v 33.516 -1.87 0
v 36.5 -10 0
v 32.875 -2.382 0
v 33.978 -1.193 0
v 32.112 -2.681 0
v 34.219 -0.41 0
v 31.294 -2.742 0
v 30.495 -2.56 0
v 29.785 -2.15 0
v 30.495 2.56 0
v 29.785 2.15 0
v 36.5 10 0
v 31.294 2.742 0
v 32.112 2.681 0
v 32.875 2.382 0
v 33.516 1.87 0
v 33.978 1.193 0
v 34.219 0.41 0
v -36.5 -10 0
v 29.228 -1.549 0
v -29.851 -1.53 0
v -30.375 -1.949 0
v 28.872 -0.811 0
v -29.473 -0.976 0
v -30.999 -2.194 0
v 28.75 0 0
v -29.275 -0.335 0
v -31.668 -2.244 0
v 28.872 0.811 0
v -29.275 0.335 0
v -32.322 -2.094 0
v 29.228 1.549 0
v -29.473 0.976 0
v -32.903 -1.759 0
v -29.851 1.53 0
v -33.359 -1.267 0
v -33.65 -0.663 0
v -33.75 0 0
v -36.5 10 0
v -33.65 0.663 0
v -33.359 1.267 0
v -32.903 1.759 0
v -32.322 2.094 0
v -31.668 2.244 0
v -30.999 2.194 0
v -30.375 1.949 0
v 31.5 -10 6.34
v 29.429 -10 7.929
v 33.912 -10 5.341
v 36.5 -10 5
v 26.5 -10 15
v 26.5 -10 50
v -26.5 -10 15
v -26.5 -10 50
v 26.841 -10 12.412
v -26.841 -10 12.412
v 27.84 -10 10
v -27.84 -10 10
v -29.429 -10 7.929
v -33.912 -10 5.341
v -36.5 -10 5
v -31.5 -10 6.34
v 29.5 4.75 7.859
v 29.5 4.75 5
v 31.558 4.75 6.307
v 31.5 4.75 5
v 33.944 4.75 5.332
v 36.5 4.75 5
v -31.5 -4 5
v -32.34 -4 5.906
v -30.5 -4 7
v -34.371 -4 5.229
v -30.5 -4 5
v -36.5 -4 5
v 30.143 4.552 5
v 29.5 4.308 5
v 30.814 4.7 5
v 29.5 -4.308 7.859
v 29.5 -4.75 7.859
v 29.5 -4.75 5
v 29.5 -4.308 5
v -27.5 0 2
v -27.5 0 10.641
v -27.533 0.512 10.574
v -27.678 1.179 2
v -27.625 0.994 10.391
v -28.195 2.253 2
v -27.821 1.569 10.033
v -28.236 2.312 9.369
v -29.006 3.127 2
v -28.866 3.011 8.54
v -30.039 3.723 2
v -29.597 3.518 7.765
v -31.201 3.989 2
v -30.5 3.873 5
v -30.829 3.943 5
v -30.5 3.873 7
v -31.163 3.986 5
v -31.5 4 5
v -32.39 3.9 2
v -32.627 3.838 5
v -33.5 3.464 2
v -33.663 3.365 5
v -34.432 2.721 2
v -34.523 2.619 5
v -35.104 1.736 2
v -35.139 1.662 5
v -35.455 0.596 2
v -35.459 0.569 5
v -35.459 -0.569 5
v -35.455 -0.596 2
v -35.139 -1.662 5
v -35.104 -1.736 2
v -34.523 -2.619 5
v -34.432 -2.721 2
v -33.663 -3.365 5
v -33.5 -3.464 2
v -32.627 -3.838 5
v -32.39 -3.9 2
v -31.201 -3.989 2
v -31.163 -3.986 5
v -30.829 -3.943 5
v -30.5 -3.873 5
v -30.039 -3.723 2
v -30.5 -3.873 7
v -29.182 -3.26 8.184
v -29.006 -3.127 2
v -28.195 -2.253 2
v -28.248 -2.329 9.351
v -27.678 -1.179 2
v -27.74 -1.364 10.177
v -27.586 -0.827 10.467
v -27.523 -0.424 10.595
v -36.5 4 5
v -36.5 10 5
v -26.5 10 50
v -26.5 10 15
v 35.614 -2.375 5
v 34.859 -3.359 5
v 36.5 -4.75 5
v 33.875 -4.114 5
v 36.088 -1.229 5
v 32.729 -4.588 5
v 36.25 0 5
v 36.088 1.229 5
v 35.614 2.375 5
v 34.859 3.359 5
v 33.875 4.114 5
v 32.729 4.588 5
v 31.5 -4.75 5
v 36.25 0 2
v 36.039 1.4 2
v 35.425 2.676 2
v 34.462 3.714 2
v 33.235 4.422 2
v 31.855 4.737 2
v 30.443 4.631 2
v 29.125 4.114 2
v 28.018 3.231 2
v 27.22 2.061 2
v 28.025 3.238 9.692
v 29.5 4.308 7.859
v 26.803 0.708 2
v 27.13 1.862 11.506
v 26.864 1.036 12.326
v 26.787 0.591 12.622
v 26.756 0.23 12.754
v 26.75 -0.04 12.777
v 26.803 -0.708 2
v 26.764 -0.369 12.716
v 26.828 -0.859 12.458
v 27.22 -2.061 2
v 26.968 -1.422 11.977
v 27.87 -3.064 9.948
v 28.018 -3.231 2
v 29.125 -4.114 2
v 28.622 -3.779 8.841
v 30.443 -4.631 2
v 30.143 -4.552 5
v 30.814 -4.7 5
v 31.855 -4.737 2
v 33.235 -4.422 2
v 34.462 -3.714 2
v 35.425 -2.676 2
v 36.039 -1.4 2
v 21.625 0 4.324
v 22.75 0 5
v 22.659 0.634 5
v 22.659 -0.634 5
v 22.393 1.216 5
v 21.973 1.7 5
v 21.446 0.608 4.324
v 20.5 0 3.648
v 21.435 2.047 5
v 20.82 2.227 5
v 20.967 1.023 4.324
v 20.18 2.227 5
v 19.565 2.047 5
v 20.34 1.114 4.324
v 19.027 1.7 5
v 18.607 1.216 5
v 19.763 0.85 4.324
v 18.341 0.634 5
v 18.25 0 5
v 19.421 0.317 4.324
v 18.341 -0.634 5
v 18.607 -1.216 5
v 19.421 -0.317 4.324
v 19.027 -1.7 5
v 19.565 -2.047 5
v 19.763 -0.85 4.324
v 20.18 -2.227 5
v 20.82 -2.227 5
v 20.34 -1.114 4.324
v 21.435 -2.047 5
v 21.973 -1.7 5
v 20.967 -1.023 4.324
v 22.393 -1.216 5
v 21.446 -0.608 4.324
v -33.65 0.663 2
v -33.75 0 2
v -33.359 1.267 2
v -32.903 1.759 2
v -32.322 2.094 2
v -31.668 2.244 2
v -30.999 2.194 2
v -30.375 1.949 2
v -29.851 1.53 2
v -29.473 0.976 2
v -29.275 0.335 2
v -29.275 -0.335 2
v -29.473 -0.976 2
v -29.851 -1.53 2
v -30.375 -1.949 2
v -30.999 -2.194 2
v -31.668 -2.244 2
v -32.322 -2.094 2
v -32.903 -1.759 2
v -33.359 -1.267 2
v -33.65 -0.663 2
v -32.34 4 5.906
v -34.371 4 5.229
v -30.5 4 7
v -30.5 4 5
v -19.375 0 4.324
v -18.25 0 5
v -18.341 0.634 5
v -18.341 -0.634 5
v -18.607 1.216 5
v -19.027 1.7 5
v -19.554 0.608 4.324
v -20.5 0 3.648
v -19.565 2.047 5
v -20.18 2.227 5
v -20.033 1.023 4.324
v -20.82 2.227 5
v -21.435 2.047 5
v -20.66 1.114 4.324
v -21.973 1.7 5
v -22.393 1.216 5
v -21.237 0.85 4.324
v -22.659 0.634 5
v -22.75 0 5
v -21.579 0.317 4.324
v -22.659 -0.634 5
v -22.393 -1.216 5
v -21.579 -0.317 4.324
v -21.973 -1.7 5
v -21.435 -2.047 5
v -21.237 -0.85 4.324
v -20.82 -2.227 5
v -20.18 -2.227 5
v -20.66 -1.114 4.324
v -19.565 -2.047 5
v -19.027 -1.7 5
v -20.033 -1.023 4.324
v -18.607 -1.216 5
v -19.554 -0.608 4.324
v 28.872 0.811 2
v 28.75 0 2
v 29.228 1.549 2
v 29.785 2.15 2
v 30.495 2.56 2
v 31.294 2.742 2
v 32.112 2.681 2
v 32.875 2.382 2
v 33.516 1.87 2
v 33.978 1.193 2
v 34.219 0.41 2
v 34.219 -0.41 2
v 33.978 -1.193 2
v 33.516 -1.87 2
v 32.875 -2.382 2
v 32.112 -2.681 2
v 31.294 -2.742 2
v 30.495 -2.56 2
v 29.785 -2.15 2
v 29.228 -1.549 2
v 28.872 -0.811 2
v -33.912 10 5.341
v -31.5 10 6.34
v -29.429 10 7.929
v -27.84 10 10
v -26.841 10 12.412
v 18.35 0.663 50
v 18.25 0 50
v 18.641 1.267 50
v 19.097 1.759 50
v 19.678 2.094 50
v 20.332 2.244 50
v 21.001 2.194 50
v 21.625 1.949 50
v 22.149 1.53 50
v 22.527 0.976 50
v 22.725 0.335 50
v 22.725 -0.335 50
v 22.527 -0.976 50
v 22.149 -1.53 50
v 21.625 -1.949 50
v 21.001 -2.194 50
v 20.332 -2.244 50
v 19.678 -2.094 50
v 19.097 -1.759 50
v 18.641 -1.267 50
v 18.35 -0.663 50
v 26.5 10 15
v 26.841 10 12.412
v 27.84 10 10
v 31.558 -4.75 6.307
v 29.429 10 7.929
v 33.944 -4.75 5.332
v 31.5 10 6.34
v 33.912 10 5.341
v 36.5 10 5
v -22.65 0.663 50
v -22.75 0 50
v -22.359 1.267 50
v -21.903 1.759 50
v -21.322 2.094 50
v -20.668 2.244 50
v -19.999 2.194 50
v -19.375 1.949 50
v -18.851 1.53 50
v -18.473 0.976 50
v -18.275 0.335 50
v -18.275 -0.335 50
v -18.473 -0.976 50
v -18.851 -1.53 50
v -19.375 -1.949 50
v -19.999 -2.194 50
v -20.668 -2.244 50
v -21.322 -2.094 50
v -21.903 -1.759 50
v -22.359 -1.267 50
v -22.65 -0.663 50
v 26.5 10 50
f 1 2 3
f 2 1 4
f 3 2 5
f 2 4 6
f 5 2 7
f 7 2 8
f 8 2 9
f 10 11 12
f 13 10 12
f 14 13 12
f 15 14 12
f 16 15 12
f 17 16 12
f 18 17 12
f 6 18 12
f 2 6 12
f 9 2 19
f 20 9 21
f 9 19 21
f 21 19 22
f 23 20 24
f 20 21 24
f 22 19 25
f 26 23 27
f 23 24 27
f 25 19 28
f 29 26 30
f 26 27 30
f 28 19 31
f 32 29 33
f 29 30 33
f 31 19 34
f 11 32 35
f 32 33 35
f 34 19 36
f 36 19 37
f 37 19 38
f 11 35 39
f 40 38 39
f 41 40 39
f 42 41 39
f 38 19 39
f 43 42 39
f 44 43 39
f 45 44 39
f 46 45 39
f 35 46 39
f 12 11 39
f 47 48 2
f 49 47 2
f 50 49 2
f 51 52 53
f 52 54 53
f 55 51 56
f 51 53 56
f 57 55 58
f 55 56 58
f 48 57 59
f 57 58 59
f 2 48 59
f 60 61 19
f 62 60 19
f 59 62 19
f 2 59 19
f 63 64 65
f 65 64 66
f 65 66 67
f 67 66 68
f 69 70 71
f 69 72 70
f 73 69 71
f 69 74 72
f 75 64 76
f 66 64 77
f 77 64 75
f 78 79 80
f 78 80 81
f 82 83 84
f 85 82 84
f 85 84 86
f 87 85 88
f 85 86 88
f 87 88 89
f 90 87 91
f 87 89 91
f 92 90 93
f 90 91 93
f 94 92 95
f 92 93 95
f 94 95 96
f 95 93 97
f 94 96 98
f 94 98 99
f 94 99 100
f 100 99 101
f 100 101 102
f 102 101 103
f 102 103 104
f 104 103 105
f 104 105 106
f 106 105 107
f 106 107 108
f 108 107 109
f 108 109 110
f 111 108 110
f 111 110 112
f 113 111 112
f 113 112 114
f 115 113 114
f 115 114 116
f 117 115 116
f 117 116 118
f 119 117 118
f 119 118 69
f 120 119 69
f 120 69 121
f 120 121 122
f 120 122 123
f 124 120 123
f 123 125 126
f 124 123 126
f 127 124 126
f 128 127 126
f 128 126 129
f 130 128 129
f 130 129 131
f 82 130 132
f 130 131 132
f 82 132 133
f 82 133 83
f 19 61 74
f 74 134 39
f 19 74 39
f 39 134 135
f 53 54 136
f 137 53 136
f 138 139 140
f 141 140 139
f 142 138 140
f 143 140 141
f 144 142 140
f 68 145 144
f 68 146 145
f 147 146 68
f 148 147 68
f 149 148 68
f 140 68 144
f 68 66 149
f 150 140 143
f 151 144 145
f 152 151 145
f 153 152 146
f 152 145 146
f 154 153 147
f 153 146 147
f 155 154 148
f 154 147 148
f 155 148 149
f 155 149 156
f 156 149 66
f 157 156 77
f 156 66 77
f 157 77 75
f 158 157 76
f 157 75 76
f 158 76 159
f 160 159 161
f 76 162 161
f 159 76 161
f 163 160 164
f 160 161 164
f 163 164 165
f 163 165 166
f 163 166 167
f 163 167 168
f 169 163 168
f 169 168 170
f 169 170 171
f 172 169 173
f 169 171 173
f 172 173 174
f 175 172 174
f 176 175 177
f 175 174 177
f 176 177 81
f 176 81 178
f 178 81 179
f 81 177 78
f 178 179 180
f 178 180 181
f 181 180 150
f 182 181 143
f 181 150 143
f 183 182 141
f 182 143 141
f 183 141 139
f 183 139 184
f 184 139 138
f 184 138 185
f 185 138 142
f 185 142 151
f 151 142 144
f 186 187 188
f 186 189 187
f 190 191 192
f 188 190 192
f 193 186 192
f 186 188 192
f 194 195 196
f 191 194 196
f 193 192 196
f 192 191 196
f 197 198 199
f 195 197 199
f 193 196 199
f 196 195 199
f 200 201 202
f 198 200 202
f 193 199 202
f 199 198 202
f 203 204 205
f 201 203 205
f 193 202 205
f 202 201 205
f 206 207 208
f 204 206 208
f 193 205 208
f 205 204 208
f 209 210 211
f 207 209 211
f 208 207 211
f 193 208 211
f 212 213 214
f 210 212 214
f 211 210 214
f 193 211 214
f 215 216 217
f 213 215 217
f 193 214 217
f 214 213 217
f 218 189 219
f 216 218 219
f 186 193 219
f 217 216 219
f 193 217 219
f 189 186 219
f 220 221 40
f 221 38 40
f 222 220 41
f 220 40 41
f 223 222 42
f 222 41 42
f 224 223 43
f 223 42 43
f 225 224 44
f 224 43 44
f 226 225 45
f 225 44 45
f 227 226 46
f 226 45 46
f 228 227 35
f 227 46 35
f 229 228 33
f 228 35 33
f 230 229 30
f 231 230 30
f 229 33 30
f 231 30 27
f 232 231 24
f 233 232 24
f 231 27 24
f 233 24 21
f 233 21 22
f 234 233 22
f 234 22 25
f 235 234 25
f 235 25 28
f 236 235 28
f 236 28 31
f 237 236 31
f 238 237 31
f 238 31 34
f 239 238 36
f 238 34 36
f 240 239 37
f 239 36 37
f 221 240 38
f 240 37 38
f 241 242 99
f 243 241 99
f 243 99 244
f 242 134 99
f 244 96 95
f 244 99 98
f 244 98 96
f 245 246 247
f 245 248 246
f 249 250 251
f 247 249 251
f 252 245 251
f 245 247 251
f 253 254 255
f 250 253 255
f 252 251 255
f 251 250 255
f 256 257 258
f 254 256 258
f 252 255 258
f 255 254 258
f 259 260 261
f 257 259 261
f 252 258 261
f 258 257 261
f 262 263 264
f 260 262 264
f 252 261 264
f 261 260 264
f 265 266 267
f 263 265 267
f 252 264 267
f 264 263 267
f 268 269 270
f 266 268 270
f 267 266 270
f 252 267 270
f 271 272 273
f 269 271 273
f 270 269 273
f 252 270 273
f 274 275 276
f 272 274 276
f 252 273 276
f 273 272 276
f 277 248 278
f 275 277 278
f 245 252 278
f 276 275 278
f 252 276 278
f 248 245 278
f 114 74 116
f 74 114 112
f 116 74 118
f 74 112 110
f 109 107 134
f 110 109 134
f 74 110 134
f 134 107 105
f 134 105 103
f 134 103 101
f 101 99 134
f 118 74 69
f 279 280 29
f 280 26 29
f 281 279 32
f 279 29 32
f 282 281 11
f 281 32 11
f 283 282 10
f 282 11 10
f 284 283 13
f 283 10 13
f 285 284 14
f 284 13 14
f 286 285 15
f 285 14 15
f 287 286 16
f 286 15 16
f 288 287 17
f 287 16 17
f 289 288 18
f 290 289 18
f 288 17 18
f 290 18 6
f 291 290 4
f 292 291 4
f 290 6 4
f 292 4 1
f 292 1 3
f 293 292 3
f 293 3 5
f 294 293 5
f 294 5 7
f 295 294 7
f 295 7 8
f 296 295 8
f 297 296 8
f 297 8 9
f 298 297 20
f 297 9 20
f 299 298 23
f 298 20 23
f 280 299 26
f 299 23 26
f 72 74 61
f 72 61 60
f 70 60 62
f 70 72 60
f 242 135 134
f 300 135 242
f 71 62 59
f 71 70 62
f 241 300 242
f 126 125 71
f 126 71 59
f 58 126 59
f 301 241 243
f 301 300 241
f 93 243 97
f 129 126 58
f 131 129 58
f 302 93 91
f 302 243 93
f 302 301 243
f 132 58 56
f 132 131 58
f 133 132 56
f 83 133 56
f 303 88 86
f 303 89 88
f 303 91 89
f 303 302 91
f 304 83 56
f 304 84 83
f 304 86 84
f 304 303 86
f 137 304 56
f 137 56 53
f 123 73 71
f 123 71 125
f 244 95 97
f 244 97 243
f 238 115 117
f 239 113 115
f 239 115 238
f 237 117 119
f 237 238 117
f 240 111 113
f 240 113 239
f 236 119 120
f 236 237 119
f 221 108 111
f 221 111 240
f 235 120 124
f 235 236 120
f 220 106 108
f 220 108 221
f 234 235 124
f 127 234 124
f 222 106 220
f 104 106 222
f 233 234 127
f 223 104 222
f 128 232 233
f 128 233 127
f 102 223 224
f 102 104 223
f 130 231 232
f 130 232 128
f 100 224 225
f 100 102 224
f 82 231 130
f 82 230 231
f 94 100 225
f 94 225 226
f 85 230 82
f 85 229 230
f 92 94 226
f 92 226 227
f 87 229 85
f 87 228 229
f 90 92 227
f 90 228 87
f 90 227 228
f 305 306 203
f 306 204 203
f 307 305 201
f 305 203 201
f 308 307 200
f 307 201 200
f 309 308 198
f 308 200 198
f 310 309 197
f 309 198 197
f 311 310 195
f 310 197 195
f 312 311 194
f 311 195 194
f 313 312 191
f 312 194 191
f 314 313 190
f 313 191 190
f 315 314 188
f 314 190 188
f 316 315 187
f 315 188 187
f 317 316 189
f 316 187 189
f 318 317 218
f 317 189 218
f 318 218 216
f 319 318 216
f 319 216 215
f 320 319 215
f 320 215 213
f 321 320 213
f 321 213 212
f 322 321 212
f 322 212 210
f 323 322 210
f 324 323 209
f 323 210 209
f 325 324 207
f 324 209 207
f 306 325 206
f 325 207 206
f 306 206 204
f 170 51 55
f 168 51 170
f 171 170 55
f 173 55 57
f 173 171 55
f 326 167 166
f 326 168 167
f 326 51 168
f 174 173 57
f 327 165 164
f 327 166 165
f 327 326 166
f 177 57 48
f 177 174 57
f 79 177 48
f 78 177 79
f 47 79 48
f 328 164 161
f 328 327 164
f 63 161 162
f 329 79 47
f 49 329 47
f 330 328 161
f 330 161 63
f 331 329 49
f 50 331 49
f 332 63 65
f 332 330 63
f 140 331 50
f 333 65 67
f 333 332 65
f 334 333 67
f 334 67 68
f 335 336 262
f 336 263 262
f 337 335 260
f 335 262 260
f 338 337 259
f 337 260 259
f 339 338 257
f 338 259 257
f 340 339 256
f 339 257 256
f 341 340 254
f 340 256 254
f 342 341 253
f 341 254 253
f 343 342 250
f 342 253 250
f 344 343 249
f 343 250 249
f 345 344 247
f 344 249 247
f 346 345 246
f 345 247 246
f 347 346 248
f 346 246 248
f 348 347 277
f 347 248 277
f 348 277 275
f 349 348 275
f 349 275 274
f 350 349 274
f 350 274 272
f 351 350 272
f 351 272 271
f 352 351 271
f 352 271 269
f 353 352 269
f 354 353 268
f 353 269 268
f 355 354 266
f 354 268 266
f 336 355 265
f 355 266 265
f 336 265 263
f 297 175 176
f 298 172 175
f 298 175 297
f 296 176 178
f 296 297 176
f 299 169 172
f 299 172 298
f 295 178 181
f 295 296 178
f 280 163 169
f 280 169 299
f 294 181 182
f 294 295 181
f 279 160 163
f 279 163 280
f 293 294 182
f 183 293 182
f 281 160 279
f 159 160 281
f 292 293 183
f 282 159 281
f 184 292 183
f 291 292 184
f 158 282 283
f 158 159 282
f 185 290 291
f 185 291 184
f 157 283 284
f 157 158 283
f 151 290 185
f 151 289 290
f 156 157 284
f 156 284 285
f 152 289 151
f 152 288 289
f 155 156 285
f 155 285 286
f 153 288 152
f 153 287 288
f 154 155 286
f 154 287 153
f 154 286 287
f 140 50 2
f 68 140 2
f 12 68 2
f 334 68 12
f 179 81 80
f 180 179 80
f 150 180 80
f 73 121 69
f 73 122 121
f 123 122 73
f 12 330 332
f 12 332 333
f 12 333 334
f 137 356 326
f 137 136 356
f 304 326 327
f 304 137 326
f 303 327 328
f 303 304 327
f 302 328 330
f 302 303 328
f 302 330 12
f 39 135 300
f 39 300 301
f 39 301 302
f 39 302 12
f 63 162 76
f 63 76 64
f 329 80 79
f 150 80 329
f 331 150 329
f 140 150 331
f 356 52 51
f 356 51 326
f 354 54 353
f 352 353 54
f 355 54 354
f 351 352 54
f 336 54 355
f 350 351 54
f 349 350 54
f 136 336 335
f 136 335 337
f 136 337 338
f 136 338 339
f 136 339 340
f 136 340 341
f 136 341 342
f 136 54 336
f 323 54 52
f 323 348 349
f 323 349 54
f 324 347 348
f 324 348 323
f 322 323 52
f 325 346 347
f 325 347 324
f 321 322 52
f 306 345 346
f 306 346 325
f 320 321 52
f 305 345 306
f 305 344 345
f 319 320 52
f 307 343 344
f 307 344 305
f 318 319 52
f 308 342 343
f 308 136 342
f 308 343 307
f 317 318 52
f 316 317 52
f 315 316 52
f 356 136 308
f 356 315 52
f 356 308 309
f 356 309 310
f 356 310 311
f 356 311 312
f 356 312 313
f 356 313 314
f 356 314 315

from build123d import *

# Parameters (mm, degrees)
SKETCH_1_W                     = 53
SKETCH_1_H                     = 20
EXTRUDE_1_DEPTH                = 50
HOLE_WIZARD_M5_1_D             = 4.5
HOLE_WIZARD_M5_1_DEPTH         = 45
HOLE_WIZARD_M5_1_TIP           = 1.351936393
SKETCH_4_W                     = 5
SKETCH_4_H                     = 20
EXTRUDE_2_DEPTH                = 20
HOLE_WIZARD_M4_1_D             = 4.5
HOLE_WIZARD_M4_1_DEPTH         = 15
HOLE_WIZARD_M4_1_CBORE_D       = 8
HOLE_WIZARD_M4_1_CBORE_DEPTH   = 3
HOLE_WIZARD_M4_1_TIP           = 1.351936393
SKETCH_7_W                     = 5
SKETCH_7_H                     = 20
EXTRUDE_3_DEPTH                = 20
HOLE_WIZARD_M5_1_2_D           = 5.5
HOLE_WIZARD_M5_1_2_DEPTH       = 15
HOLE_WIZARD_M5_1_2_CBORE_D     = 9.5
HOLE_WIZARD_M5_1_2_CBORE_DEPTH = 3
HOLE_WIZARD_M5_1_2_TIP         = 1.652366702
FILLET_1_R                     = 10
SKETCH_10_W                    = 6
SKETCH_10_H                    = 8
SKETCH_10_W_2                  = 7
SKETCH_10_H_2                  = 9.5
CUT_EXTRUDE_1_DEPTH            = 20
SKETCH_11_W                    = 10
SKETCH_11_H                    = 20
CUT_EXTRUDE_2_DEPTH            = 10


with BuildPart() as part:
    # 스케치1 → 보스-돌출1 (new body)
    with BuildSketch(Plane.XY):
        Rectangle(SKETCH_1_W, SKETCH_1_H)
    extrude(amount=EXTRUDE_1_DEPTH)

    # Hole Wizard M5 _ _1
    with Locations(Plane.XY.offset(50)):
        with Locations((20.5, 0), (-20.5, 0)):
            Hole(HOLE_WIZARD_M5_1_D / 2, depth=HOLE_WIZARD_M5_1_DEPTH)
            with Locations((0, 0, -(HOLE_WIZARD_M5_1_DEPTH + HOLE_WIZARD_M5_1_TIP / 2))):  # 118° drill point
                Cone(0, HOLE_WIZARD_M5_1_D / 2, HOLE_WIZARD_M5_1_TIP, mode=Mode.SUBTRACT)

    # 스케치4 → 보스-돌출2 (add)
    with BuildSketch(Plane.ZY.offset(26.5)):
        with Locations((2.5, 0)):
            Rectangle(SKETCH_4_W, SKETCH_4_H)
    extrude(amount=EXTRUDE_2_DEPTH)

    # M4 소켓 머리 캡 나사용 카운터보어1
    with Locations(Plane.XY.offset(5)):
        with Locations((-31.5, 0)):
            CounterBoreHole(HOLE_WIZARD_M4_1_D / 2, HOLE_WIZARD_M4_1_CBORE_D / 2, HOLE_WIZARD_M4_1_CBORE_DEPTH, depth=HOLE_WIZARD_M4_1_DEPTH)
            with Locations((0, 0, -(HOLE_WIZARD_M4_1_DEPTH + HOLE_WIZARD_M4_1_TIP / 2))):  # 118° drill point
                Cone(0, HOLE_WIZARD_M4_1_D / 2, HOLE_WIZARD_M4_1_TIP, mode=Mode.SUBTRACT)

    # 스케치7 → 보스-돌출3 (add)
    with BuildSketch(Plane(origin=(26.5, 0, 0), x_dir=(0, 0, -1), z_dir=(1, 0, 0))):
        with Locations((-2.5, 0)):
            Rectangle(SKETCH_7_W, SKETCH_7_H)
    extrude(amount=EXTRUDE_3_DEPTH)

    # Hole Wizard M5 _ _ _ _ _1 2
    with Locations(Plane.XY.offset(5)):
        with Locations((31.5, 0)):
            CounterBoreHole(HOLE_WIZARD_M5_1_2_D / 2, HOLE_WIZARD_M5_1_2_CBORE_D / 2, HOLE_WIZARD_M5_1_2_CBORE_DEPTH, depth=HOLE_WIZARD_M5_1_2_DEPTH)
            with Locations((0, 0, -(HOLE_WIZARD_M5_1_2_DEPTH + HOLE_WIZARD_M5_1_2_TIP / 2))):  # 118° drill point
                Cone(0, HOLE_WIZARD_M5_1_2_D / 2, HOLE_WIZARD_M5_1_2_TIP, mode=Mode.SUBTRACT)

    # 필렛1
    # the kernel refuses this fillet: 10 mm, written as the material it adds along each edge
    with BuildSketch(Plane(origin=(-26.5, 10, 5), x_dir=(0, 0, 1), z_dir=(0, -1, 0))) as fillet_1_piece_1_section:
        with BuildLine():
            CenterArc((FILLET_1_R, FILLET_1_R), FILLET_1_R, 180, 90)
            Line((0, FILLET_1_R), (0, 0))
            Line((0, 0), (FILLET_1_R, 0))
        make_face()
    fillet_1_piece_1 = extrude(amount=20, mode=Mode.PRIVATE)
    fillet_1_piece_1 = fillet_1_piece_1 - Plane(origin=(-31.5, 0, 12.39249306), x_dir=(1, 0, 0), z_dir=(0, 0, 1)) * Cylinder(4, 81, mode=Mode.PRIVATE)
    add(fillet_1_piece_1)
    with BuildSketch(Plane(origin=(26.5, 10, 5), x_dir=(0, 0, 1), z_dir=(0, -1, 0))) as fillet_1_piece_2_section:
        with BuildLine():
            CenterArc((FILLET_1_R, -FILLET_1_R), FILLET_1_R, 90, 90)
            Line((0, -FILLET_1_R), (0, 0))
            Line((0, 0), (FILLET_1_R, 0))
        make_face()
    fillet_1_piece_2 = extrude(amount=20, mode=Mode.PRIVATE)
    fillet_1_piece_2 = fillet_1_piece_2 - Plane(origin=(31.5, 0, 12.393306283), x_dir=(1, 0, 0), z_dir=(0, 0, 1)) * Cylinder(4.75, 80, mode=Mode.PRIVATE)
    add(fillet_1_piece_2)

    # 스케치10 → 컷-돌출1 (cut)
    with BuildSketch(Plane.XY.offset(5)):
        with Locations((-33.5, 0)):
            Rectangle(SKETCH_10_W, SKETCH_10_H)
        with Locations((33, 0)):
            Rectangle(SKETCH_10_W_2, SKETCH_10_H_2)
    extrude(amount=CUT_EXTRUDE_1_DEPTH, mode=Mode.SUBTRACT)

    # 스케치11 → 컷-돌출2 (cut)
    with BuildSketch(Plane.XY.offset(5)):
        with Locations((-41.5, 0)):
            Rectangle(SKETCH_11_W, SKETCH_11_H)
        with Locations((41.5, 0)):
            Rectangle(SKETCH_11_W, SKETCH_11_H)
    extrude(amount=-CUT_EXTRUDE_2_DEPTH, mode=Mode.SUBTRACT)


solid = part.part
